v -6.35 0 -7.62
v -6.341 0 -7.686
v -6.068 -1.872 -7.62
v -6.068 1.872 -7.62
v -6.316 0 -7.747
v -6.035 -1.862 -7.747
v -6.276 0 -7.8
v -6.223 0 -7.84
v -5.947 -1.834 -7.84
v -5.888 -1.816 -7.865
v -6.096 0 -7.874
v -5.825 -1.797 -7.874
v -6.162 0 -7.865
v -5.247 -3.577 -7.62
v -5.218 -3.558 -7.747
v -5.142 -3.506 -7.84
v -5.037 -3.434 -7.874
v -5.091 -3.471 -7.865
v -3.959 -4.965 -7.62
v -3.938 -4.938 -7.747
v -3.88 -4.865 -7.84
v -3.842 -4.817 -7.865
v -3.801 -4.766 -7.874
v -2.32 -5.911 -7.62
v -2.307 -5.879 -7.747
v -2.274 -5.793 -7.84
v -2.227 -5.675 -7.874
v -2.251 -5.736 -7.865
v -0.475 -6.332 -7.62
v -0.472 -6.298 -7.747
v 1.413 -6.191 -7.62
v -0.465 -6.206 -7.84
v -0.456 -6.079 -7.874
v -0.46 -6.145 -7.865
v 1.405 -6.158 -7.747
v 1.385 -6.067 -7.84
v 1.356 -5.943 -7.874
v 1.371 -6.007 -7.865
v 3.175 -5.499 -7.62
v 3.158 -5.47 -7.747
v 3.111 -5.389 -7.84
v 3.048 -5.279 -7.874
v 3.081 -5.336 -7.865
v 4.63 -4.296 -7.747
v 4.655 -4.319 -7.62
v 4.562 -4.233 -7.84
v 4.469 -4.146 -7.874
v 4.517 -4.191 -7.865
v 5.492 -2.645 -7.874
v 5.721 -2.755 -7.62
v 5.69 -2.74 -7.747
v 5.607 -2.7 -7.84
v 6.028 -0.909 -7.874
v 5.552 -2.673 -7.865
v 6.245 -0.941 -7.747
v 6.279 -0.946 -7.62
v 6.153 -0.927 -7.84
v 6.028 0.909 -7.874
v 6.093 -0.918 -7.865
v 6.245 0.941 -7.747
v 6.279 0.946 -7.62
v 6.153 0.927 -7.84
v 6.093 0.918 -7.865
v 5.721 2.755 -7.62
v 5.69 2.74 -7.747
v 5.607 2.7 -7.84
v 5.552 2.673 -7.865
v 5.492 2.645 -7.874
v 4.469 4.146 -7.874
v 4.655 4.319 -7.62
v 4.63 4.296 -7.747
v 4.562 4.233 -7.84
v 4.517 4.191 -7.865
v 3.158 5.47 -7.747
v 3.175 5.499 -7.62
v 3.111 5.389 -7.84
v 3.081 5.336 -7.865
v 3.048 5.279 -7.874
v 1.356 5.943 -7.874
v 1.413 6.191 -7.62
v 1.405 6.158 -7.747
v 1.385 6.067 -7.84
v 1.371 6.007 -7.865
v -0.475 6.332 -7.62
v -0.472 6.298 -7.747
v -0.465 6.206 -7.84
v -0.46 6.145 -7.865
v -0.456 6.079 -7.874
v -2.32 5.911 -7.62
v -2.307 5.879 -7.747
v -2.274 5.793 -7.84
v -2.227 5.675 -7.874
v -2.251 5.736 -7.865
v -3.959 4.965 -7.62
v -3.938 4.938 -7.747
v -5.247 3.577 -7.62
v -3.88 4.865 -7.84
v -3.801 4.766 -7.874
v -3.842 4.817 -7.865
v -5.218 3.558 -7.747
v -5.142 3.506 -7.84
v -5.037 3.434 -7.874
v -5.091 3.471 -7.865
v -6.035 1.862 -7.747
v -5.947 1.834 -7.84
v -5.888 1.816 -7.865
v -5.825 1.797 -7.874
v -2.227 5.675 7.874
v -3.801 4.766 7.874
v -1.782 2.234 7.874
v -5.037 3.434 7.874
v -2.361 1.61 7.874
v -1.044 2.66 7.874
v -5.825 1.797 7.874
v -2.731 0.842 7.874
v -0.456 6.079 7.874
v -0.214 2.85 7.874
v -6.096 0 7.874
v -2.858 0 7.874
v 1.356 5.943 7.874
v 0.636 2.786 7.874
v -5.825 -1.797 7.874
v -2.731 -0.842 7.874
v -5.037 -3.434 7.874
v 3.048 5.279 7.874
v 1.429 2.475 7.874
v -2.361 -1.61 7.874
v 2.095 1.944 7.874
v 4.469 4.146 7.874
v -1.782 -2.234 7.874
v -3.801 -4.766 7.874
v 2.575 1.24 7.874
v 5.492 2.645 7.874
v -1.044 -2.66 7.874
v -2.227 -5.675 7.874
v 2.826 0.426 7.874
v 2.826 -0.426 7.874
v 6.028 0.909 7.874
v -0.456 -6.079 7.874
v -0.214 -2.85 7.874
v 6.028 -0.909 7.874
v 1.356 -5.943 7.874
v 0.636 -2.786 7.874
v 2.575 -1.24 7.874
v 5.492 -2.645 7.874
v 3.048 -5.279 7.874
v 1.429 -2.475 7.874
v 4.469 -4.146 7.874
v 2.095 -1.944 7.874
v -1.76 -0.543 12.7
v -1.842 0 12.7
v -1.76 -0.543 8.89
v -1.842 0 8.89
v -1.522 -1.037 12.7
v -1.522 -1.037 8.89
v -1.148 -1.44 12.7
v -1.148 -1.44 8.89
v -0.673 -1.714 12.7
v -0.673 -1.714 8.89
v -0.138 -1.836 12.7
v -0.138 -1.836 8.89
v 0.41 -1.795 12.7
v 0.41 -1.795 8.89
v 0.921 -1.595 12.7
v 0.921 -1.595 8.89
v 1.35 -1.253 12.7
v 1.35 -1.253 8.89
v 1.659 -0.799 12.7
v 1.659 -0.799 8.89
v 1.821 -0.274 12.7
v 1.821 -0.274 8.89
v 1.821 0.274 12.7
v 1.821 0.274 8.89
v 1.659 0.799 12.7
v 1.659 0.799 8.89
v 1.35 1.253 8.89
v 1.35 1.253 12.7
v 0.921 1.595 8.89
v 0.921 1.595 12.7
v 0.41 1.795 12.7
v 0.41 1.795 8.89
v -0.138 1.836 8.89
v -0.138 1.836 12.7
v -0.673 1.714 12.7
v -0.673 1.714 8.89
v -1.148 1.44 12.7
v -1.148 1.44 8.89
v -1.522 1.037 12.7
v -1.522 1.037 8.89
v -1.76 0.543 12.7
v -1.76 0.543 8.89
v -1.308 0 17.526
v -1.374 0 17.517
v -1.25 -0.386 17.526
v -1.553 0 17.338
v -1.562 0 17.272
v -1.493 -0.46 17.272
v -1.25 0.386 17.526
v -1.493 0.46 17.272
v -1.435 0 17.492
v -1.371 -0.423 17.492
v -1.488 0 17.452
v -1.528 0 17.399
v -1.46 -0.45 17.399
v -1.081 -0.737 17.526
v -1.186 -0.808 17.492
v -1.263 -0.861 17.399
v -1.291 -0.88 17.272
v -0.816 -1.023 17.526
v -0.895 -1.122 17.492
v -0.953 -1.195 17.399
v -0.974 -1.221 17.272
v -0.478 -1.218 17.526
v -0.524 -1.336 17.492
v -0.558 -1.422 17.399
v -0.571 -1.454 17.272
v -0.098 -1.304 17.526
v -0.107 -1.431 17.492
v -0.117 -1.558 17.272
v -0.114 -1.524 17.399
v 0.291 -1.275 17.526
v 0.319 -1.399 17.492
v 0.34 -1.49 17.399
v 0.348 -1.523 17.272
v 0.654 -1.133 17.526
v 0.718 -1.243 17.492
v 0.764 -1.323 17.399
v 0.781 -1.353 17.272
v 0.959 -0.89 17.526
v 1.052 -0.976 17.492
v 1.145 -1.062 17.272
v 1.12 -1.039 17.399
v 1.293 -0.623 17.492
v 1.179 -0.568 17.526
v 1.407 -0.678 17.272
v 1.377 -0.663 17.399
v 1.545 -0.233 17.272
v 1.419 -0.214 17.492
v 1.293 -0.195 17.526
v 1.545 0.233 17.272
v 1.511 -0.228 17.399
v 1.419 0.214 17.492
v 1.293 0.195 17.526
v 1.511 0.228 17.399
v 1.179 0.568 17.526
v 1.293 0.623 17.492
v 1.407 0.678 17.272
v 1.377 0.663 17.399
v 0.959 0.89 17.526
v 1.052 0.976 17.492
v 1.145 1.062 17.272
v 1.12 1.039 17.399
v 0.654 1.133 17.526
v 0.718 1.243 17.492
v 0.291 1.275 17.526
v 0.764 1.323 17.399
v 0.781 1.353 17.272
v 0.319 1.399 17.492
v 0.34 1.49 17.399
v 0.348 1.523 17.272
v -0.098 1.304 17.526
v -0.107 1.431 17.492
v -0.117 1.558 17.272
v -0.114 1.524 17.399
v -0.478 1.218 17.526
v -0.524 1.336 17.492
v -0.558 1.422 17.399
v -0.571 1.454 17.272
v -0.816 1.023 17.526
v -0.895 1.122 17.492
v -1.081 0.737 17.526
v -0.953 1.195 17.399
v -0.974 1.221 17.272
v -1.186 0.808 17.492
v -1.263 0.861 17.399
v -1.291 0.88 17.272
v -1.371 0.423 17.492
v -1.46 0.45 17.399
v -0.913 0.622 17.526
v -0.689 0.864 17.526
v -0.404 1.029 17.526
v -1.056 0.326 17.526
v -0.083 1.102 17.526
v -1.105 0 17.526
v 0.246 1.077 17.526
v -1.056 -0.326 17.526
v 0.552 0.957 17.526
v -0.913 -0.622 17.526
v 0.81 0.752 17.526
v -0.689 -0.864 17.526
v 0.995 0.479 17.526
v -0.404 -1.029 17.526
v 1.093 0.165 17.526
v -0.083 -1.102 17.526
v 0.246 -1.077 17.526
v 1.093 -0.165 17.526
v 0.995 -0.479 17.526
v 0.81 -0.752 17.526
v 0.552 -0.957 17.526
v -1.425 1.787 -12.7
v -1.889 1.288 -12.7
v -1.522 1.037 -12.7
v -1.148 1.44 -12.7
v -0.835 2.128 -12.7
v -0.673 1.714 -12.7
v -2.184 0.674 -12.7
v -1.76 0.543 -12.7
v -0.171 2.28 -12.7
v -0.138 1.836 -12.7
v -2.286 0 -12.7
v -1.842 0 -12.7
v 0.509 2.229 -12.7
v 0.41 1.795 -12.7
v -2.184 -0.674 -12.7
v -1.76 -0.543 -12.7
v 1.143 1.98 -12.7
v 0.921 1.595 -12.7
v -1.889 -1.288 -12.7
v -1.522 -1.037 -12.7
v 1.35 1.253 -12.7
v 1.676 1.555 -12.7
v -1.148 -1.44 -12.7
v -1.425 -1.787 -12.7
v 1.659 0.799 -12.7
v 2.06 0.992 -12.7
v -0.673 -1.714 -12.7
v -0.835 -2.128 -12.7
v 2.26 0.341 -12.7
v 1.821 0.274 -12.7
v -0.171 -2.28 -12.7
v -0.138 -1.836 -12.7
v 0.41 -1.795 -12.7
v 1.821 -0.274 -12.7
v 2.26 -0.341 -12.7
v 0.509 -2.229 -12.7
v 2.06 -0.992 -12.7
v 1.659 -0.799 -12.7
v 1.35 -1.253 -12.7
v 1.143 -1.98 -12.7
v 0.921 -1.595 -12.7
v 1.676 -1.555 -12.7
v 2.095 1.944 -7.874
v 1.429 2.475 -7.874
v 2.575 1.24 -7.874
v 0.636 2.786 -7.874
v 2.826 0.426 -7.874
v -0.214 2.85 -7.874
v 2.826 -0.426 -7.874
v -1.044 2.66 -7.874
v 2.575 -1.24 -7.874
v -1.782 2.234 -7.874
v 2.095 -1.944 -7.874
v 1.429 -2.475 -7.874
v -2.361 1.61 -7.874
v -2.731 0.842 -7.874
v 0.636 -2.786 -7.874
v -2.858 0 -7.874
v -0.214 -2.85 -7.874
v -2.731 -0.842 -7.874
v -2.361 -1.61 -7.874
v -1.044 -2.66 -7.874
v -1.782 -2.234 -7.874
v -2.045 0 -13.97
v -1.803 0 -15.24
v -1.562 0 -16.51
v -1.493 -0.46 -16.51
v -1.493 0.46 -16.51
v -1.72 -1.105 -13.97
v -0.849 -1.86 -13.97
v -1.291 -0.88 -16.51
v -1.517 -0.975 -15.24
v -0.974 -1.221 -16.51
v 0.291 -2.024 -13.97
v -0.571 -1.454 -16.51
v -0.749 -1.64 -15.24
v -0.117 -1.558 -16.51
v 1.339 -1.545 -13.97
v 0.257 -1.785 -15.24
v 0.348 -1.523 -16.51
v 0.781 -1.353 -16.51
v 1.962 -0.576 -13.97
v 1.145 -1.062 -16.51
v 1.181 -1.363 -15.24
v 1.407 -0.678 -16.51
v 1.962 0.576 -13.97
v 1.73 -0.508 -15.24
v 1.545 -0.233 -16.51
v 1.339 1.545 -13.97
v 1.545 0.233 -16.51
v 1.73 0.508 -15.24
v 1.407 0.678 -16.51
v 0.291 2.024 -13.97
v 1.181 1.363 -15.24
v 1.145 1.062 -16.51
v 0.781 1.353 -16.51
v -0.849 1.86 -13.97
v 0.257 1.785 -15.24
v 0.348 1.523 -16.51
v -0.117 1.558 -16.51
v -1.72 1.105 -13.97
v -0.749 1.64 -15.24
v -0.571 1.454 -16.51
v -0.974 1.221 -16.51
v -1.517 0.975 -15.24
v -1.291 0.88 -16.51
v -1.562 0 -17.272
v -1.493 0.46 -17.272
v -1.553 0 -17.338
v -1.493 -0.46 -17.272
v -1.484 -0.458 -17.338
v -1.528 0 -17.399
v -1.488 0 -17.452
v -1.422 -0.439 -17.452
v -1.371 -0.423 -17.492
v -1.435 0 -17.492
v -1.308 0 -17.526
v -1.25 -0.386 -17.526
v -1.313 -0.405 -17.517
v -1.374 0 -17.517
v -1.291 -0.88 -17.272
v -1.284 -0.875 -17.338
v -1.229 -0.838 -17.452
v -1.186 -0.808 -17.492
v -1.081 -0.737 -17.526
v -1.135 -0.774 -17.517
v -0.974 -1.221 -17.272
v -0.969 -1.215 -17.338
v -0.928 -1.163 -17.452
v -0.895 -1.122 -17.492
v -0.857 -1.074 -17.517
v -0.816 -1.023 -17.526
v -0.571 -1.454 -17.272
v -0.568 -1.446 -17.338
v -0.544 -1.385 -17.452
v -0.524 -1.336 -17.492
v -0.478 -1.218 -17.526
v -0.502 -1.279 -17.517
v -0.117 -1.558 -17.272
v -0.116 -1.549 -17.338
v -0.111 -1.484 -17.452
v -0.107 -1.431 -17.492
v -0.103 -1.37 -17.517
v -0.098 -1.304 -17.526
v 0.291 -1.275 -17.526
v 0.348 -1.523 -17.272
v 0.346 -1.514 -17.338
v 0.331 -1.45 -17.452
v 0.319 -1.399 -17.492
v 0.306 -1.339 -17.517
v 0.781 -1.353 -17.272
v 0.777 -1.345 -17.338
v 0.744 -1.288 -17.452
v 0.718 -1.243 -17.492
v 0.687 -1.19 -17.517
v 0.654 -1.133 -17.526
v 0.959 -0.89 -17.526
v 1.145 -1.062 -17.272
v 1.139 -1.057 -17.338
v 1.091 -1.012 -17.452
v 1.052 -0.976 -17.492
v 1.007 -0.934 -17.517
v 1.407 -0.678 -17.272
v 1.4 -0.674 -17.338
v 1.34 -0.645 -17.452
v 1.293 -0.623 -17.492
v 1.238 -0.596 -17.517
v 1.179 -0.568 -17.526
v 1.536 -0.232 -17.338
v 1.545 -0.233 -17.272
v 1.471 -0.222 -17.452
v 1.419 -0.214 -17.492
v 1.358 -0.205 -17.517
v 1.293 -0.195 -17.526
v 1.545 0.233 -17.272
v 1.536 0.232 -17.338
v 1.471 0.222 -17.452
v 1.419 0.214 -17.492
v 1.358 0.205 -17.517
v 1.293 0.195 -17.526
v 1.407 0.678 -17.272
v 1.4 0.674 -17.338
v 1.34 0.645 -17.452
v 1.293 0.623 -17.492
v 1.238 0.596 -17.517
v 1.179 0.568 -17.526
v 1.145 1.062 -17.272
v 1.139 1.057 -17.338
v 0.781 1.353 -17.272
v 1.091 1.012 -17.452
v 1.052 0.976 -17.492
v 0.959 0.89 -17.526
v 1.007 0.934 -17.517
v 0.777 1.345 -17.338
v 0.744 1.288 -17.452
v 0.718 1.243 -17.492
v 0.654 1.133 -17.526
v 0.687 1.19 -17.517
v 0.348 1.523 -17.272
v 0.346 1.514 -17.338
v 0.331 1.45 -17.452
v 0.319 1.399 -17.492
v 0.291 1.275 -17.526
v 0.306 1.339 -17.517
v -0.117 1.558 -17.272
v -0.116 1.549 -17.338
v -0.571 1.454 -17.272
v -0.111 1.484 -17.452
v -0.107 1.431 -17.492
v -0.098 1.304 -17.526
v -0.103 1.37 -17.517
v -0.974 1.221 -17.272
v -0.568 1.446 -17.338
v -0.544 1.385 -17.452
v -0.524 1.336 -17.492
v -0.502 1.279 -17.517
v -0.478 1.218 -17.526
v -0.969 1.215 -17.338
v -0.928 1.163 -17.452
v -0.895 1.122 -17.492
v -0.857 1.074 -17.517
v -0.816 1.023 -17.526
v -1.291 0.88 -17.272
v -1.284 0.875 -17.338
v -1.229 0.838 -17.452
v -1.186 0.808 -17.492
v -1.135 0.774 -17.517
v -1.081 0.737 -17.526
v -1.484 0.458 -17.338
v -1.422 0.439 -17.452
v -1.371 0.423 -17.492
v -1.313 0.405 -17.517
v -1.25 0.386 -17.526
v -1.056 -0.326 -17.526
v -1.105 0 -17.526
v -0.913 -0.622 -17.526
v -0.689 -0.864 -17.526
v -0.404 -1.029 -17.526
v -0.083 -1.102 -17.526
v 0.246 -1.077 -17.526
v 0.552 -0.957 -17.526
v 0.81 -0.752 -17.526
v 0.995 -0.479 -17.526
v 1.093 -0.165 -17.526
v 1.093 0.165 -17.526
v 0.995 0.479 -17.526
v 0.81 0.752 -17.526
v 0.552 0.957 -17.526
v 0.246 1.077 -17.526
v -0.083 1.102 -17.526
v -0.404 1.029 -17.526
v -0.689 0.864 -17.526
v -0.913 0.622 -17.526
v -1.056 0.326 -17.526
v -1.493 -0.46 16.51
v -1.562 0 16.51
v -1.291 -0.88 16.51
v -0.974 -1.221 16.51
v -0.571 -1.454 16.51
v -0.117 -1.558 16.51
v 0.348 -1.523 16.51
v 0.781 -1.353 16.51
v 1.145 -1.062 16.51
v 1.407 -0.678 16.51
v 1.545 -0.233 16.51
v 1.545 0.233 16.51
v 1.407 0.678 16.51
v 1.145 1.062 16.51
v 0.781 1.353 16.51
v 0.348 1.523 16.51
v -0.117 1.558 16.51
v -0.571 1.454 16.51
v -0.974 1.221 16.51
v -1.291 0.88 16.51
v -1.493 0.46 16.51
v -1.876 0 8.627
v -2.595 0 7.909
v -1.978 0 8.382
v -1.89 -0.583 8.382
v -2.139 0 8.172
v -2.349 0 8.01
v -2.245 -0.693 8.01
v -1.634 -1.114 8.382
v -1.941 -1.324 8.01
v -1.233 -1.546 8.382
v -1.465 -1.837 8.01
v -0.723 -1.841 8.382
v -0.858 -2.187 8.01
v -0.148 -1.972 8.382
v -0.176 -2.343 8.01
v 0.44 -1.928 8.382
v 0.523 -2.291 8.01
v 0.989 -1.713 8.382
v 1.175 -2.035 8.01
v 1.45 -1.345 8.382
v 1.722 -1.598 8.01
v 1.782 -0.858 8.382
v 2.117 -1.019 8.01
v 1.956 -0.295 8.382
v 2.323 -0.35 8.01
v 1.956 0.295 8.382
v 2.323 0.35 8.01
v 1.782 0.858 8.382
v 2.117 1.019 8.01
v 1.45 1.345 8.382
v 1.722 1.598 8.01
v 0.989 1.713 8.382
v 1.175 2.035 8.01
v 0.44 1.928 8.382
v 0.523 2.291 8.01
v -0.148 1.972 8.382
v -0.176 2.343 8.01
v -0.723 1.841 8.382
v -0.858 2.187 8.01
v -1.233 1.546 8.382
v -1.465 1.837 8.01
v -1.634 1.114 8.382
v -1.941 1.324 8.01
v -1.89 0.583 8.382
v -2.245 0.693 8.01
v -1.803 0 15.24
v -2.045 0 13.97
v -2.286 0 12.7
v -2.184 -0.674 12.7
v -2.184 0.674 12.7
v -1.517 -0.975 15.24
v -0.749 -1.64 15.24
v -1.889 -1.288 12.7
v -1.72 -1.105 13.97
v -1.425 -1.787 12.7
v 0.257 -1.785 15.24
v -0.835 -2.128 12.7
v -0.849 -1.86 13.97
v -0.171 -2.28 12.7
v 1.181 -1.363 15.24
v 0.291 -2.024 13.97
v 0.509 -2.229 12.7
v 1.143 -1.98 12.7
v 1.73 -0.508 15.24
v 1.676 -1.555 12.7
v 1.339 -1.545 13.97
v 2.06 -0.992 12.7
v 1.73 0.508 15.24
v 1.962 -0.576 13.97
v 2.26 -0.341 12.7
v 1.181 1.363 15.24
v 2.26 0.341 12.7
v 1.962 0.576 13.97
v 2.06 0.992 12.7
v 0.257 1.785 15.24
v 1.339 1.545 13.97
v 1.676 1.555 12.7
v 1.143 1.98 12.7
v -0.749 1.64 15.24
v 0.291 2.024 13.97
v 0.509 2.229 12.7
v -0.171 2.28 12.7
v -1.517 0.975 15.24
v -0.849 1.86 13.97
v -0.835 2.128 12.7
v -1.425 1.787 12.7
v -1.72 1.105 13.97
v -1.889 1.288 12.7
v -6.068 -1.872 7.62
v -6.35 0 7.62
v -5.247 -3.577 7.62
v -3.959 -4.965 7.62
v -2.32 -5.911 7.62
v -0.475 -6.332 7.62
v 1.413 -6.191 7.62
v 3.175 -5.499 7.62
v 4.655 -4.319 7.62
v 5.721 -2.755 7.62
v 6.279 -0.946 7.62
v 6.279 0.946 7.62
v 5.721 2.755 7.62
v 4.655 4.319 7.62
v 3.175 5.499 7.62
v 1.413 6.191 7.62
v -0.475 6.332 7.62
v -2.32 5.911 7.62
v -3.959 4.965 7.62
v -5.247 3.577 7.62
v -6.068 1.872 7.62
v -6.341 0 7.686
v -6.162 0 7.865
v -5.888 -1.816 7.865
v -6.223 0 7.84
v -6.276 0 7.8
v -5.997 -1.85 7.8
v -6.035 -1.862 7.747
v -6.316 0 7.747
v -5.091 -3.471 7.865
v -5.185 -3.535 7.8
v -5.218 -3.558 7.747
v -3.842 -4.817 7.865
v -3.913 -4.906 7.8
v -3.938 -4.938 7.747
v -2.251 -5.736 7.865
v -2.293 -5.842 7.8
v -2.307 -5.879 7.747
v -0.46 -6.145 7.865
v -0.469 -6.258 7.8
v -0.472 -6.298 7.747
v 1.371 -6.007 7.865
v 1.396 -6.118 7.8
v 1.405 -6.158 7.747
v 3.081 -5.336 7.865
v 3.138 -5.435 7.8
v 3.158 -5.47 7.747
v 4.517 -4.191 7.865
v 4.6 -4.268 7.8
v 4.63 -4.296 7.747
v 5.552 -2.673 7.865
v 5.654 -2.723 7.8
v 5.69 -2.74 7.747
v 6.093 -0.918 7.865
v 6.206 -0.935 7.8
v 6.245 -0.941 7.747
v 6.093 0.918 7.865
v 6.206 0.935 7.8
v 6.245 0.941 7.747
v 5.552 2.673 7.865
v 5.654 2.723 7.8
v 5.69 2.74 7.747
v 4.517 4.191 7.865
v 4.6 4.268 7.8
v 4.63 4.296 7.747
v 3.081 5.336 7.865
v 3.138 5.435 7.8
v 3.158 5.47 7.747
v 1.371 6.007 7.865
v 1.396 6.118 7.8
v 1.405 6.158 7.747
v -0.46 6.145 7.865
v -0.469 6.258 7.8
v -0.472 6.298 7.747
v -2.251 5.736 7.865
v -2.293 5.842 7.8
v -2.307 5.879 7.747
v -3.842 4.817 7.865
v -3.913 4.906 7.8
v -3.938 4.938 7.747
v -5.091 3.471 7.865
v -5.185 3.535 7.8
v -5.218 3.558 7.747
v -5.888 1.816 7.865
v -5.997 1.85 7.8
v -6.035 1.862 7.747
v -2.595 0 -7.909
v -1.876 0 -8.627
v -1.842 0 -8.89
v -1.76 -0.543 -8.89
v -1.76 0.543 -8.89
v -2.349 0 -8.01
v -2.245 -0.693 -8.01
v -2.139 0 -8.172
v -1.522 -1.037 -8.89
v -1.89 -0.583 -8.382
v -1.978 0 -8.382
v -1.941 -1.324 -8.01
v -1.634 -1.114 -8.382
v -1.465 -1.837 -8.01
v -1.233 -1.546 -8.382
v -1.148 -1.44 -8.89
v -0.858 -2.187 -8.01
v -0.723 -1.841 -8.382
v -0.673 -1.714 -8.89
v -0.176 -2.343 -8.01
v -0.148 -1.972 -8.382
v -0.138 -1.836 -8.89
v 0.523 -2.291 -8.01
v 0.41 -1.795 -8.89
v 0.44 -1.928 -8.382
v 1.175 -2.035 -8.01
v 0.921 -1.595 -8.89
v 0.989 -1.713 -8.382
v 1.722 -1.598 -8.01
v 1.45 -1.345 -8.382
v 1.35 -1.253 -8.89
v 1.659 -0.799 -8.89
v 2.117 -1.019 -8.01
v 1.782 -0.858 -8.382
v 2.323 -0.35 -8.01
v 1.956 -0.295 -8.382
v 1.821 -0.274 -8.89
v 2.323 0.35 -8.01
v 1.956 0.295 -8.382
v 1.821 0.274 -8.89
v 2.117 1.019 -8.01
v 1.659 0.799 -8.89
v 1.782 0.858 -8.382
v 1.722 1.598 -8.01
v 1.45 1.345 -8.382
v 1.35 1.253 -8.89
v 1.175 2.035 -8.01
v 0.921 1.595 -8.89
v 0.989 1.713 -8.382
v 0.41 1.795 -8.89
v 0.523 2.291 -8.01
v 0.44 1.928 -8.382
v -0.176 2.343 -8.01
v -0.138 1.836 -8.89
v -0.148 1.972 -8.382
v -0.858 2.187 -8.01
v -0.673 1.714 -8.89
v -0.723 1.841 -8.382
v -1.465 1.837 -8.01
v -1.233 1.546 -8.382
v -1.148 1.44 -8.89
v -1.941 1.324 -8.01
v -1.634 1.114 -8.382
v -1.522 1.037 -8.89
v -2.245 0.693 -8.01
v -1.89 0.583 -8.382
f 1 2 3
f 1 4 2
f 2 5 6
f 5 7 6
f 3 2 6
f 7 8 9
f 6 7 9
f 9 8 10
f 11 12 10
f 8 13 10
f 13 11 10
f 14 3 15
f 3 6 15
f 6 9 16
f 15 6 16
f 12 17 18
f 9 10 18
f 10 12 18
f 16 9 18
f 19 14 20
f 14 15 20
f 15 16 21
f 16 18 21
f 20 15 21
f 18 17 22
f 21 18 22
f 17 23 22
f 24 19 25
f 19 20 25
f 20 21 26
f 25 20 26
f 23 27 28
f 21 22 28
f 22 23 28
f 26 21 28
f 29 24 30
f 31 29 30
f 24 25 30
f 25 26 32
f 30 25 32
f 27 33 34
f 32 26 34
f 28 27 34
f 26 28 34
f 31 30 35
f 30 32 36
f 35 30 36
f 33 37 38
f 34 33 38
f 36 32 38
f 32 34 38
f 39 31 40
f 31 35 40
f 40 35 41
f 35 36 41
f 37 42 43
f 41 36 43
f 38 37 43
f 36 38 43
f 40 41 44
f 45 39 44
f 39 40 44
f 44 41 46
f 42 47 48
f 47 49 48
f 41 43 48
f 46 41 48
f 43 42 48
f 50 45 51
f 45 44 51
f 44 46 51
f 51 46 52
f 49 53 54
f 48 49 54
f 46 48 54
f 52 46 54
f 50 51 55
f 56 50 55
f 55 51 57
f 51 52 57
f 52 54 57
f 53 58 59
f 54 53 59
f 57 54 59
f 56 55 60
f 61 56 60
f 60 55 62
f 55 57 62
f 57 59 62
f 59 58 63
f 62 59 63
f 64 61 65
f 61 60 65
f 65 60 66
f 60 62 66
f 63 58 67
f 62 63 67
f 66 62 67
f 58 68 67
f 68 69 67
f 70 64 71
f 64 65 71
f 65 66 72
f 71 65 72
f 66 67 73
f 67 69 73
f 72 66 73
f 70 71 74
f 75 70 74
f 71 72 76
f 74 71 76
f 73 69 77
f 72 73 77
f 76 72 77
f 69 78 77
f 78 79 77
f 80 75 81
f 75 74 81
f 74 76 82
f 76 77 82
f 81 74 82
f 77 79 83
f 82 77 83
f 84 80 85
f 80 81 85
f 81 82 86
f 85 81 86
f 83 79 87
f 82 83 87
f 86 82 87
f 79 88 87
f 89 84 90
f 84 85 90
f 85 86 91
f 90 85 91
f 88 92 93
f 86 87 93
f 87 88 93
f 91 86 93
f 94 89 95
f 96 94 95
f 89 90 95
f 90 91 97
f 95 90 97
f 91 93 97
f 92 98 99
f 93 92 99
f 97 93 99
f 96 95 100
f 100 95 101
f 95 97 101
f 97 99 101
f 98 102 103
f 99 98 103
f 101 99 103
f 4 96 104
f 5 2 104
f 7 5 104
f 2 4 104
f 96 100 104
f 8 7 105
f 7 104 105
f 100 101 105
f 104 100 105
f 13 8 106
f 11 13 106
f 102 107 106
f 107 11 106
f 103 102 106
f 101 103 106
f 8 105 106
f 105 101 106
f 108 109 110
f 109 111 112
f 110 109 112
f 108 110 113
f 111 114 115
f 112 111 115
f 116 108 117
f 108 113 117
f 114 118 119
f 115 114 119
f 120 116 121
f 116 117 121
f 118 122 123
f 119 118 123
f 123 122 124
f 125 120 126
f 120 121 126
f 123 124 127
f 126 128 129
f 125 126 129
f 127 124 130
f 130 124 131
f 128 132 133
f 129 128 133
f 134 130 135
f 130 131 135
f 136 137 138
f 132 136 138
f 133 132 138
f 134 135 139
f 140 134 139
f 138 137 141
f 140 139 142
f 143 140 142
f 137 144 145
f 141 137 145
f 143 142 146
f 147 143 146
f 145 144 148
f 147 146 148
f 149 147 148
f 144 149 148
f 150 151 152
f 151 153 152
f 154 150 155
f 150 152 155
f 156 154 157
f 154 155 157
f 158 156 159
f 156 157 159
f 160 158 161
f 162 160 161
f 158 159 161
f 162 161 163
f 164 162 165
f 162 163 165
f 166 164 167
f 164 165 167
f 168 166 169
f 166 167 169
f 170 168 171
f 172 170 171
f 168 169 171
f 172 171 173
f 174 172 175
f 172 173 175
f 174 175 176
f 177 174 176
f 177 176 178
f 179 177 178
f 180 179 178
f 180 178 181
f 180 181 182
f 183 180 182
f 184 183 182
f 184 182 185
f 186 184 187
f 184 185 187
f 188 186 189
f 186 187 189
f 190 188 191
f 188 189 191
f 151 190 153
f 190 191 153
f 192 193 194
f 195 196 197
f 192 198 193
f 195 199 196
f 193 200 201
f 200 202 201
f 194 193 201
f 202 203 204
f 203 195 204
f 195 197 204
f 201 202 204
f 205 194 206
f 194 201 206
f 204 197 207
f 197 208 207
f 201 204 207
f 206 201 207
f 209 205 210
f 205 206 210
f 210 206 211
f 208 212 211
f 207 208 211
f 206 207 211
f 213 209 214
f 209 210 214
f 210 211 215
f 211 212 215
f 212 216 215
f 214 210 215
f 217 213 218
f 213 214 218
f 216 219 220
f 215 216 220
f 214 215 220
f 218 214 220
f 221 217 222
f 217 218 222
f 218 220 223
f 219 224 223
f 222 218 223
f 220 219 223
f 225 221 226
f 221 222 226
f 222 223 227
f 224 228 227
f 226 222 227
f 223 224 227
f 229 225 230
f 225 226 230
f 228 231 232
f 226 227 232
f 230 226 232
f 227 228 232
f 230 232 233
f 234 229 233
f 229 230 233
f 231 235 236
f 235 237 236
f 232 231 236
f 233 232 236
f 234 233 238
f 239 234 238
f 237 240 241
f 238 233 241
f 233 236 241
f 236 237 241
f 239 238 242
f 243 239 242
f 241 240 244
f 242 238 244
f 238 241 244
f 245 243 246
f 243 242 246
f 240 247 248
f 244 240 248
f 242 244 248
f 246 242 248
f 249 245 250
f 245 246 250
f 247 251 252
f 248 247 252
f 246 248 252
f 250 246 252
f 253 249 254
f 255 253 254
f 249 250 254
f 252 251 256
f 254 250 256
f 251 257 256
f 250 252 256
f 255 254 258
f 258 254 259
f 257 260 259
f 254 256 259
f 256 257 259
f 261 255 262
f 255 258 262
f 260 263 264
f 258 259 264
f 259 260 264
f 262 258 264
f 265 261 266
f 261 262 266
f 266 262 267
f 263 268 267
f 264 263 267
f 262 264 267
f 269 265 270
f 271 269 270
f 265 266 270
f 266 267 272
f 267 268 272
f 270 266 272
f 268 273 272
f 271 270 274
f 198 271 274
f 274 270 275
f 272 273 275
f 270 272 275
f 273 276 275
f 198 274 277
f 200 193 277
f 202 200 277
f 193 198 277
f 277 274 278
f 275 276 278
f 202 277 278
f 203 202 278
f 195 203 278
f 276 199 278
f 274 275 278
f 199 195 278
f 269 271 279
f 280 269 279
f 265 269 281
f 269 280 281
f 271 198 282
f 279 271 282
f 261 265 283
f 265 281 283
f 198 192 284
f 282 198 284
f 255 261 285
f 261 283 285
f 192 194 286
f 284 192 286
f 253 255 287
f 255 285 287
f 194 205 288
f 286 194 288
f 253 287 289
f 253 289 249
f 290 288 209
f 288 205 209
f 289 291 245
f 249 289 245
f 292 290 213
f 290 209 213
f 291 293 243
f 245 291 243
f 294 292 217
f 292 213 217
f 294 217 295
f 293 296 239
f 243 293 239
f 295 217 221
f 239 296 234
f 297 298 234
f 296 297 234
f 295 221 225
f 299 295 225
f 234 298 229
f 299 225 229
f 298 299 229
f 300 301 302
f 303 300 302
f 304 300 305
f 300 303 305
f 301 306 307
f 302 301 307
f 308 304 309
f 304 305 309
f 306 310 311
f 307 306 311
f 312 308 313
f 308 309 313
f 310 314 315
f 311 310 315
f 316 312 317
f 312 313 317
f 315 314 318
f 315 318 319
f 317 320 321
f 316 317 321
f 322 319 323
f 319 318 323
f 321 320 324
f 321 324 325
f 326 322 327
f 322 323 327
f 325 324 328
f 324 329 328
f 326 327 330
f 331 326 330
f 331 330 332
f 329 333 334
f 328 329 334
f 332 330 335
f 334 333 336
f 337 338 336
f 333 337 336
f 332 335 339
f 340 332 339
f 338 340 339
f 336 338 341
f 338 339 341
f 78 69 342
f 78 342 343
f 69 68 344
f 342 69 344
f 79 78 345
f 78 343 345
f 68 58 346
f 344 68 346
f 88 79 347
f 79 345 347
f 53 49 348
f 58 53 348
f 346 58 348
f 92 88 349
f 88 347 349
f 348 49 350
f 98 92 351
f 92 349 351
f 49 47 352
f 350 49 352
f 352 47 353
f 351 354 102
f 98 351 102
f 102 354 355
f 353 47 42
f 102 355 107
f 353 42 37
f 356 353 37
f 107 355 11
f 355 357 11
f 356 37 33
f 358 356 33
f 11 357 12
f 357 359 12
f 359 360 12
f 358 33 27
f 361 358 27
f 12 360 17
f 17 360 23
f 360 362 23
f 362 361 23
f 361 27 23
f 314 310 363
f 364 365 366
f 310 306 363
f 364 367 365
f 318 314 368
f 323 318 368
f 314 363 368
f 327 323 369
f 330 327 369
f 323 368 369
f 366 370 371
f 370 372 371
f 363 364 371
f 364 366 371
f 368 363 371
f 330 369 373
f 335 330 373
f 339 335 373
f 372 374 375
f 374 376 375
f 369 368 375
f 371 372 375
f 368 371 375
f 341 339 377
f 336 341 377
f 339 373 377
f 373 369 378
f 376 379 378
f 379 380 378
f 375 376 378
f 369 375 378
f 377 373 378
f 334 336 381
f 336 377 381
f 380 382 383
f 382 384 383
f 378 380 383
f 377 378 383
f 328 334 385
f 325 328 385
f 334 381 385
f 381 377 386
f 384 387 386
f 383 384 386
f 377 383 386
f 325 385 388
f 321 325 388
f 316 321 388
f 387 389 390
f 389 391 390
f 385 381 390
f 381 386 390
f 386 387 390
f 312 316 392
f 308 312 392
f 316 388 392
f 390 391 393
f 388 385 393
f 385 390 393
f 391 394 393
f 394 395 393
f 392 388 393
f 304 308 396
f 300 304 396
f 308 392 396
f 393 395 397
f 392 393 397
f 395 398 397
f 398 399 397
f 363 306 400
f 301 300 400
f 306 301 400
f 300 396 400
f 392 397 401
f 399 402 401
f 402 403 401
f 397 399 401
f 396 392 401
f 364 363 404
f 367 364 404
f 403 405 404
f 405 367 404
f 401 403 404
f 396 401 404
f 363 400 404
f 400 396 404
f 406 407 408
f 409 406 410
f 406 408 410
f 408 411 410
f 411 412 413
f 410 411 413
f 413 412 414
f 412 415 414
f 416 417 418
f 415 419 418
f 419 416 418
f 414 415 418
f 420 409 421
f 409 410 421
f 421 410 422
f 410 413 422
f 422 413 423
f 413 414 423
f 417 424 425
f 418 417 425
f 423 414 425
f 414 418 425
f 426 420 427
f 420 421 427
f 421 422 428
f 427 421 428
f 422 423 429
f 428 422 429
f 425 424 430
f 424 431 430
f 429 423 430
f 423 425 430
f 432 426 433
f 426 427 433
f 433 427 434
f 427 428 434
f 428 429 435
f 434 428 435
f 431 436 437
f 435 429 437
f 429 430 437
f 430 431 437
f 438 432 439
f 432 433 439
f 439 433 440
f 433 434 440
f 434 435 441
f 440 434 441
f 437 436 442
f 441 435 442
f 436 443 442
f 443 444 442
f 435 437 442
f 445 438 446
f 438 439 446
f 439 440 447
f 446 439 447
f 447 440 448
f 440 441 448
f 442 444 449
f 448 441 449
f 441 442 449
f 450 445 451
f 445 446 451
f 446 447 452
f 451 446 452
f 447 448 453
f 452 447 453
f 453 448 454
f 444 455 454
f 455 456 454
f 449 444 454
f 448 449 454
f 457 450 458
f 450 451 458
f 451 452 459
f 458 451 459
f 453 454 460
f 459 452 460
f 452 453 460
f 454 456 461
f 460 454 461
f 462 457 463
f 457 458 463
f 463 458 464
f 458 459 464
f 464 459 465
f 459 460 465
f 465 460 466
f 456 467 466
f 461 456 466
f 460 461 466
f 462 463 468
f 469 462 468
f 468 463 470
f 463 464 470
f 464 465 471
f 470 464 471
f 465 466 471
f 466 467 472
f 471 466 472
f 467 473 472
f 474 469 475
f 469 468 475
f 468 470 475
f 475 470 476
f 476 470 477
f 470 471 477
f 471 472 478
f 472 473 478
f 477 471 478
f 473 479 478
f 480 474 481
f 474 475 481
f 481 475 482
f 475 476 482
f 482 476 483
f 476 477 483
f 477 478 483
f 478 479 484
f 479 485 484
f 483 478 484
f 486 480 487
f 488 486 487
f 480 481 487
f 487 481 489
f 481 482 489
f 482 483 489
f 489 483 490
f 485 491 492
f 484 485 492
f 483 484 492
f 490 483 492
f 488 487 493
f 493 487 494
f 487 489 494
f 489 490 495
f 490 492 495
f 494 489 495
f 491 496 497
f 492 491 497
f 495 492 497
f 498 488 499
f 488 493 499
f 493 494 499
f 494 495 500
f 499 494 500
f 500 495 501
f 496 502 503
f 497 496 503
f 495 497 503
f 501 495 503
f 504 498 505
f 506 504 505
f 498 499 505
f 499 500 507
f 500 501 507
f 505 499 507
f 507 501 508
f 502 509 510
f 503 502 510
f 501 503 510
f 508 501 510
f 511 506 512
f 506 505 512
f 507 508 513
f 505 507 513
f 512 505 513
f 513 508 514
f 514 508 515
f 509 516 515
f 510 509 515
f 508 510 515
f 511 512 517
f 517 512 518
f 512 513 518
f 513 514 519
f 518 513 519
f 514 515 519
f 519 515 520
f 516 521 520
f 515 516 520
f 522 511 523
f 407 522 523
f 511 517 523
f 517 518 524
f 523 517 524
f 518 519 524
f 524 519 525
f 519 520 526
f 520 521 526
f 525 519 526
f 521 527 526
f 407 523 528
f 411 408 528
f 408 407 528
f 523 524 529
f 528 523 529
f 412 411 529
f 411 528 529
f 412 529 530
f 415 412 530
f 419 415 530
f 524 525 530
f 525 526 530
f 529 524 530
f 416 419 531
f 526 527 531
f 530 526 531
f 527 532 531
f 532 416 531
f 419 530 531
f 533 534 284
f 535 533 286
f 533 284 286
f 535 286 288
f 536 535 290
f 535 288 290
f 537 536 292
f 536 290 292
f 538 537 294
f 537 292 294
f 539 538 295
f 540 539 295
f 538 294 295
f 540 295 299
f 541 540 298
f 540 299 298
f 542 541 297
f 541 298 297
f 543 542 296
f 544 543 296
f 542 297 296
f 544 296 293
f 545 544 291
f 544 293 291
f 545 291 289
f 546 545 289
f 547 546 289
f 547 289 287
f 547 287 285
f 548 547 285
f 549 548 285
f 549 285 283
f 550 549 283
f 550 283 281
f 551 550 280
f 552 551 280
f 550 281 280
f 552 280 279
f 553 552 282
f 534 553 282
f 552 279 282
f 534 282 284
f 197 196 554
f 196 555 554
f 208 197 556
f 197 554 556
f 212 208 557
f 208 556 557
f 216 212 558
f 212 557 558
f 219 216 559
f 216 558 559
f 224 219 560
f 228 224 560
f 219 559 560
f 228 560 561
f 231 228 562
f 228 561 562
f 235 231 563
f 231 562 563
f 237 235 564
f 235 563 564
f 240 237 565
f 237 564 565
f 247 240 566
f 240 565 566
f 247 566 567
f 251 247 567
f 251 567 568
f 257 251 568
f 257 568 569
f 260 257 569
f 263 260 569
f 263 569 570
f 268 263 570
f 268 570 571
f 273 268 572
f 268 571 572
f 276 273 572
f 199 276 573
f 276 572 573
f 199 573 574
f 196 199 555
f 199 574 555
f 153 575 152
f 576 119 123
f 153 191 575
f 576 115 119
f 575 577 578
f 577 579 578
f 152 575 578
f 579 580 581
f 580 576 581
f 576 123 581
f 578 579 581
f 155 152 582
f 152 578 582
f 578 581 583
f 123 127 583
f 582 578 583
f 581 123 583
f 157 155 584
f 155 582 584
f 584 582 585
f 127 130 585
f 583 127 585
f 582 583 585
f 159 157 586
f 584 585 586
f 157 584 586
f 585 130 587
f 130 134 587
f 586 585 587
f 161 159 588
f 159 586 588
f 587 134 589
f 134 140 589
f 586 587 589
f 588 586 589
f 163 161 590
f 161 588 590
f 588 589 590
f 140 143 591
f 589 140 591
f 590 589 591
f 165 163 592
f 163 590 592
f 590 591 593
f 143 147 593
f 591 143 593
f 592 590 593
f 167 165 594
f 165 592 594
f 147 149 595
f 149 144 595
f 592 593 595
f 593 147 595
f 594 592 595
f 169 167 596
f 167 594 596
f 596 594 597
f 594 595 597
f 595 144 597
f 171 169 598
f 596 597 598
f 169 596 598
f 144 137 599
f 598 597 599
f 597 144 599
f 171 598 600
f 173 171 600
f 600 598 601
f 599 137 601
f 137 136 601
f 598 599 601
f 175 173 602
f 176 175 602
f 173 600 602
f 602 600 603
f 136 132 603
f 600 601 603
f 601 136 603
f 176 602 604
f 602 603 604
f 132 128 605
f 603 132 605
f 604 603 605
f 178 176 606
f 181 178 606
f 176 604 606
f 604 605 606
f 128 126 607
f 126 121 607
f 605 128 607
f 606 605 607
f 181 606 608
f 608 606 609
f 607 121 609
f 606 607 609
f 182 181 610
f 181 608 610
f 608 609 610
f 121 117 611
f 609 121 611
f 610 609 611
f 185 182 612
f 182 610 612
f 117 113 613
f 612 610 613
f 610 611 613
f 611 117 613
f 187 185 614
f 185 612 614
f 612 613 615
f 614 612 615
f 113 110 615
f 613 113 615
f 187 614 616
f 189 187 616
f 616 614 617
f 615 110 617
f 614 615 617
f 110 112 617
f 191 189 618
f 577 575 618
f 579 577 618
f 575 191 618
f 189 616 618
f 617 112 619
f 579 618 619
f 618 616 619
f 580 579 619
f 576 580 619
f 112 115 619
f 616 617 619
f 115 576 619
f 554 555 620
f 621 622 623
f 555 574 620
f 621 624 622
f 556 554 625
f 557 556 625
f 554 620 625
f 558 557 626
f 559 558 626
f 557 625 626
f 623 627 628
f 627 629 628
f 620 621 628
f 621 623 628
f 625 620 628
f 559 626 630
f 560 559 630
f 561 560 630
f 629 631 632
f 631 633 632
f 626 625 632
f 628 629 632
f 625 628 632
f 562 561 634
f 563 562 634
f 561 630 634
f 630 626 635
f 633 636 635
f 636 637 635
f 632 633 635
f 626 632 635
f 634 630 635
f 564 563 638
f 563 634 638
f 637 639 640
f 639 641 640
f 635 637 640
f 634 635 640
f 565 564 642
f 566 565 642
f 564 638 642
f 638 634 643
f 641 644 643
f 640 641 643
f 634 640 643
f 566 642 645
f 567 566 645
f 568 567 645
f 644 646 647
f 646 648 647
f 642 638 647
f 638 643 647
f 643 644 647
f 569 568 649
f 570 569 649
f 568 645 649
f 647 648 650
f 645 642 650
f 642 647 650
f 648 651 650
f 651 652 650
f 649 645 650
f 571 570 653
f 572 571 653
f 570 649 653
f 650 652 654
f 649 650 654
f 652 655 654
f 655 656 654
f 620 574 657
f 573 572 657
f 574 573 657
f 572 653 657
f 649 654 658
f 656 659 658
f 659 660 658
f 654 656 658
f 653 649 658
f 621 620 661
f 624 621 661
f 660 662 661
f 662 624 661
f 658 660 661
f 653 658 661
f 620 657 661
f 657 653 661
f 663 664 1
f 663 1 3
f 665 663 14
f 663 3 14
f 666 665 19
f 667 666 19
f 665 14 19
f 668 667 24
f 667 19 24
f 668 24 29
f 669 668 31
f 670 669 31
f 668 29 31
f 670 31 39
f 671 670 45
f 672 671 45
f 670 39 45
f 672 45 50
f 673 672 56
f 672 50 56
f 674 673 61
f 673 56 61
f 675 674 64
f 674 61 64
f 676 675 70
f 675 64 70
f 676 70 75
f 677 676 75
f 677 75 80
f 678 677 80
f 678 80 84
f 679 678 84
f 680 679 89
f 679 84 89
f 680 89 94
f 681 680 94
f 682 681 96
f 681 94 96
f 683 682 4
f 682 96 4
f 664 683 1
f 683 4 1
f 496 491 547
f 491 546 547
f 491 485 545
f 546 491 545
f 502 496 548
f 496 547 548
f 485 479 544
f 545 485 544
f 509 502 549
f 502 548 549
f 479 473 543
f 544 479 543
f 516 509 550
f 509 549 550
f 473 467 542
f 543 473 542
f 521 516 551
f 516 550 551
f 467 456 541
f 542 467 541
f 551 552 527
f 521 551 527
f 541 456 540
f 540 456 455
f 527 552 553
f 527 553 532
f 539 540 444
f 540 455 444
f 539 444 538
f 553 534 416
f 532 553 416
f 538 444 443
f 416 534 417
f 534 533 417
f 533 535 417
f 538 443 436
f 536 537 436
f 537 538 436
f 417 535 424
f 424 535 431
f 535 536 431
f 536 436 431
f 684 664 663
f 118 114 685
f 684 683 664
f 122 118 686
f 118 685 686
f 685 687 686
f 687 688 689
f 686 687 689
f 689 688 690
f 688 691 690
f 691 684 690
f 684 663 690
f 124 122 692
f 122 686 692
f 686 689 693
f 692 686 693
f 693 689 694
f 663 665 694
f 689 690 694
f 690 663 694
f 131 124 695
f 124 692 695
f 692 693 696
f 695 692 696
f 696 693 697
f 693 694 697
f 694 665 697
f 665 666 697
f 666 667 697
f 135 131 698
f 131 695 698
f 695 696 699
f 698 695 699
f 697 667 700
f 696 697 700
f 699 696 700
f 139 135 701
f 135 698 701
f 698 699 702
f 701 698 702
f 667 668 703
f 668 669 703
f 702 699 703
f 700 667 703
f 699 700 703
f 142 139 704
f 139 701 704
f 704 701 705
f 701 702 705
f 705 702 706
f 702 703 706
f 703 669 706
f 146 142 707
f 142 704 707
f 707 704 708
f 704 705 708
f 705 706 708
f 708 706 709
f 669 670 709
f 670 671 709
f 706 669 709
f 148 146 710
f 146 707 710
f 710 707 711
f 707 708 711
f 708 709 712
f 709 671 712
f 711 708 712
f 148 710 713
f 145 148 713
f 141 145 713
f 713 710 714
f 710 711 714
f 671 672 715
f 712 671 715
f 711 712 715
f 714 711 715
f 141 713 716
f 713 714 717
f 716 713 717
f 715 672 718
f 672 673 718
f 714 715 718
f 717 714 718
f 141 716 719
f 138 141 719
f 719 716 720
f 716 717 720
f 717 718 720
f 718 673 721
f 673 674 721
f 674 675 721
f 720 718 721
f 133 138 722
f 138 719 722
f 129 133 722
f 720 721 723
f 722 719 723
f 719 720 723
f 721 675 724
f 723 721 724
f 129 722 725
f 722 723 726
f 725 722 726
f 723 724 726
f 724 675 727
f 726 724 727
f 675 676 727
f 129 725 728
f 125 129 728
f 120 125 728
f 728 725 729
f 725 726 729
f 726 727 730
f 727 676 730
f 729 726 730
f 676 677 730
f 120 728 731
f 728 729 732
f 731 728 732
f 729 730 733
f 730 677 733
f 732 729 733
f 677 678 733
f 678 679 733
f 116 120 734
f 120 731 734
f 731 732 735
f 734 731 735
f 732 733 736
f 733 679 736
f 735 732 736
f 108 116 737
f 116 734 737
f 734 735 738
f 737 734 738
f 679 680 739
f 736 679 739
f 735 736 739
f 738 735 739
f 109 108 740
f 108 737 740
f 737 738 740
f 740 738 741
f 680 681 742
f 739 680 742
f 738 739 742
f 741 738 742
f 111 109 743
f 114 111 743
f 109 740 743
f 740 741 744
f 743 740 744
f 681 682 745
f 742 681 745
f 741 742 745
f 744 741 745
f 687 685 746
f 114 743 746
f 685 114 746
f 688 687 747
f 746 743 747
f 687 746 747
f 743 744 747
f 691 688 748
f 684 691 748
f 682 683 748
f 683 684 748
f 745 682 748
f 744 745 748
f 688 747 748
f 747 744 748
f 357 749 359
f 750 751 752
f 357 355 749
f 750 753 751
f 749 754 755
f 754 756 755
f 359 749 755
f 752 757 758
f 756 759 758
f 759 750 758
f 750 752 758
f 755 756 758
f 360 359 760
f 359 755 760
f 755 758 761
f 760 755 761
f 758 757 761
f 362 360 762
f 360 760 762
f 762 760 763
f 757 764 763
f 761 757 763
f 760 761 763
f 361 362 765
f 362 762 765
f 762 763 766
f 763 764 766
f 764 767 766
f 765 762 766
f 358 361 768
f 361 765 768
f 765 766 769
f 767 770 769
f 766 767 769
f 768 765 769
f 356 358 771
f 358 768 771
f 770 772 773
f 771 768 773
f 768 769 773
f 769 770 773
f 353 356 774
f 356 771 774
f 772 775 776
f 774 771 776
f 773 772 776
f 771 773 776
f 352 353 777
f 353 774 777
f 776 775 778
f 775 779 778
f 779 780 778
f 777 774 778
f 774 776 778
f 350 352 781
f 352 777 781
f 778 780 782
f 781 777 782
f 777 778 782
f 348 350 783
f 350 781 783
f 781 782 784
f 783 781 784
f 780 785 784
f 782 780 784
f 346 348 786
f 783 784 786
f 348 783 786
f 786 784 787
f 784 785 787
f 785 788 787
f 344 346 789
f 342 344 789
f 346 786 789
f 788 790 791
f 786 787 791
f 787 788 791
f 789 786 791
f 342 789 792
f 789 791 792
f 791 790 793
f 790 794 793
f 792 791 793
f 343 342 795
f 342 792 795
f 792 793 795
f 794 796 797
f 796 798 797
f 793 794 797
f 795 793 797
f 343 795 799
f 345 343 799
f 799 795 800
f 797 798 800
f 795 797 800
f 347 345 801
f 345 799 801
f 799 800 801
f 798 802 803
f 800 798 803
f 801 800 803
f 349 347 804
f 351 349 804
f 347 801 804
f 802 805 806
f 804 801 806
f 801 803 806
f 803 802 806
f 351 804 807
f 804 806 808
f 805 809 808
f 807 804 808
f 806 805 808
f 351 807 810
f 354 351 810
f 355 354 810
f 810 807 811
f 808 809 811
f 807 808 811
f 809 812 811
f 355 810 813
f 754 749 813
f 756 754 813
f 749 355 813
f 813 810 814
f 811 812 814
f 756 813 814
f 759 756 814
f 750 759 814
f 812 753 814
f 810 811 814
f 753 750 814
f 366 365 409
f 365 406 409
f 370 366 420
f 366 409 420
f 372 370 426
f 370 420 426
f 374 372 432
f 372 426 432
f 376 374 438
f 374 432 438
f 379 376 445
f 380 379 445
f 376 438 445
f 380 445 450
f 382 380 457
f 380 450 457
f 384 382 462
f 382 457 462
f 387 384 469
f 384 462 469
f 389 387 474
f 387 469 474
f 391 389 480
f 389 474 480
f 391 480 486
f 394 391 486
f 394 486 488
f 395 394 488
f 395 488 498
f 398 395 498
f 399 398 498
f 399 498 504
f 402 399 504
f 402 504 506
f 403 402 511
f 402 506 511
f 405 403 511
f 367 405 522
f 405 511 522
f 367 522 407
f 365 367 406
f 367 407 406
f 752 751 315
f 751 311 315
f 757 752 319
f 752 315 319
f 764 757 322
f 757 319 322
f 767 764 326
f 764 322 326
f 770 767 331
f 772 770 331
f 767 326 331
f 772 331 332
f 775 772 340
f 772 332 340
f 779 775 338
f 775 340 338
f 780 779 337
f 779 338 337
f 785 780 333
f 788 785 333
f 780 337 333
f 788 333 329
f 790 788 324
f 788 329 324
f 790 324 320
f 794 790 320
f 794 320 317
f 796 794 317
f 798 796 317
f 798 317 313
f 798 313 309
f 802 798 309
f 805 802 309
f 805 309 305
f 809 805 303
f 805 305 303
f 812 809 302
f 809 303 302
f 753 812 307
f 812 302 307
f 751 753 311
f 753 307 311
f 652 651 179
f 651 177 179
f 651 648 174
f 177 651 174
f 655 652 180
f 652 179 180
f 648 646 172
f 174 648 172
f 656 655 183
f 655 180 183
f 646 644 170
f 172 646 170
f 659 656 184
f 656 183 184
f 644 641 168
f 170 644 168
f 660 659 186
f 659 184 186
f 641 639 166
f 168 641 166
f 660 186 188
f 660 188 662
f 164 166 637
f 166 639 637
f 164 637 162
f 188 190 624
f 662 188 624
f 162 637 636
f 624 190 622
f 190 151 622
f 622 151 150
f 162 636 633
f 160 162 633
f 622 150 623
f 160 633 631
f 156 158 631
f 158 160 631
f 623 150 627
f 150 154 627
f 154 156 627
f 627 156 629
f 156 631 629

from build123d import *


with BuildPart() as part:
    # Sketch2 → Revolve1 (revolve)
    with BuildSketch(Plane(origin=(0, 0, 0), x_dir=(0, 0, -1), z_dir=(1, 0, 0)), mode=Mode.PRIVATE) as revolve1_sk:
        with BuildLine():
            Line((-17.526, 1.1049), (-17.526, 1.3081))
            ThreePointArc((-17.526, 1.3081), (-17.451605122, 1.487705122), (-17.272, 1.5621))
            Line((-17.272, 1.5621), (-16.51, 1.5621))
            Line((-16.51, 1.5621), (-12.7, 2.286))
            Line((-12.7, 2.286), (-12.7, 1.8415))
            Line((-12.7, 1.8415), (-8.89, 1.8415))
            ThreePointArc((-8.89, 1.8415), (-8.17157951, 2.13907951), (-7.874, 2.8575))
            Line((-7.874, 2.8575), (-7.874, 6.096))
            ThreePointArc((-7.874, 6.096), (-7.799605122, 6.275605122), (-7.62, 6.35))
            Line((-7.62, 6.35), (7.62, 6.35))
            ThreePointArc((7.62, 6.35), (7.799605122, 6.275605122), (7.874, 6.096))
            Line((7.874, 6.096), (7.874, 2.8575))
            ThreePointArc((7.874, 2.8575), (8.17157951, 2.13907951), (8.89, 1.8415))
            Line((8.89, 1.8415), (12.7, 1.8415))
            Line((12.7, 1.8415), (12.7, 2.286))
            Line((12.7, 2.286), (16.51, 1.5621))
            Line((16.51, 1.5621), (17.272, 1.5621))
            ThreePointArc((17.272, 1.5621), (17.451605122, 1.487705122), (17.526, 1.3081))
            Line((17.526, 1.3081), (17.526, 1.1049))
            Line((17.526, 1.1049), (-17.526, 1.1049))
        make_face()
    revolve(revolve1_sk.sketch.rotate(Axis((0, 0, -17.526), (0, 0, 1)), 90), axis=Axis((0, 0, -17.526), (0, 0, 1)))


solid = part.part
